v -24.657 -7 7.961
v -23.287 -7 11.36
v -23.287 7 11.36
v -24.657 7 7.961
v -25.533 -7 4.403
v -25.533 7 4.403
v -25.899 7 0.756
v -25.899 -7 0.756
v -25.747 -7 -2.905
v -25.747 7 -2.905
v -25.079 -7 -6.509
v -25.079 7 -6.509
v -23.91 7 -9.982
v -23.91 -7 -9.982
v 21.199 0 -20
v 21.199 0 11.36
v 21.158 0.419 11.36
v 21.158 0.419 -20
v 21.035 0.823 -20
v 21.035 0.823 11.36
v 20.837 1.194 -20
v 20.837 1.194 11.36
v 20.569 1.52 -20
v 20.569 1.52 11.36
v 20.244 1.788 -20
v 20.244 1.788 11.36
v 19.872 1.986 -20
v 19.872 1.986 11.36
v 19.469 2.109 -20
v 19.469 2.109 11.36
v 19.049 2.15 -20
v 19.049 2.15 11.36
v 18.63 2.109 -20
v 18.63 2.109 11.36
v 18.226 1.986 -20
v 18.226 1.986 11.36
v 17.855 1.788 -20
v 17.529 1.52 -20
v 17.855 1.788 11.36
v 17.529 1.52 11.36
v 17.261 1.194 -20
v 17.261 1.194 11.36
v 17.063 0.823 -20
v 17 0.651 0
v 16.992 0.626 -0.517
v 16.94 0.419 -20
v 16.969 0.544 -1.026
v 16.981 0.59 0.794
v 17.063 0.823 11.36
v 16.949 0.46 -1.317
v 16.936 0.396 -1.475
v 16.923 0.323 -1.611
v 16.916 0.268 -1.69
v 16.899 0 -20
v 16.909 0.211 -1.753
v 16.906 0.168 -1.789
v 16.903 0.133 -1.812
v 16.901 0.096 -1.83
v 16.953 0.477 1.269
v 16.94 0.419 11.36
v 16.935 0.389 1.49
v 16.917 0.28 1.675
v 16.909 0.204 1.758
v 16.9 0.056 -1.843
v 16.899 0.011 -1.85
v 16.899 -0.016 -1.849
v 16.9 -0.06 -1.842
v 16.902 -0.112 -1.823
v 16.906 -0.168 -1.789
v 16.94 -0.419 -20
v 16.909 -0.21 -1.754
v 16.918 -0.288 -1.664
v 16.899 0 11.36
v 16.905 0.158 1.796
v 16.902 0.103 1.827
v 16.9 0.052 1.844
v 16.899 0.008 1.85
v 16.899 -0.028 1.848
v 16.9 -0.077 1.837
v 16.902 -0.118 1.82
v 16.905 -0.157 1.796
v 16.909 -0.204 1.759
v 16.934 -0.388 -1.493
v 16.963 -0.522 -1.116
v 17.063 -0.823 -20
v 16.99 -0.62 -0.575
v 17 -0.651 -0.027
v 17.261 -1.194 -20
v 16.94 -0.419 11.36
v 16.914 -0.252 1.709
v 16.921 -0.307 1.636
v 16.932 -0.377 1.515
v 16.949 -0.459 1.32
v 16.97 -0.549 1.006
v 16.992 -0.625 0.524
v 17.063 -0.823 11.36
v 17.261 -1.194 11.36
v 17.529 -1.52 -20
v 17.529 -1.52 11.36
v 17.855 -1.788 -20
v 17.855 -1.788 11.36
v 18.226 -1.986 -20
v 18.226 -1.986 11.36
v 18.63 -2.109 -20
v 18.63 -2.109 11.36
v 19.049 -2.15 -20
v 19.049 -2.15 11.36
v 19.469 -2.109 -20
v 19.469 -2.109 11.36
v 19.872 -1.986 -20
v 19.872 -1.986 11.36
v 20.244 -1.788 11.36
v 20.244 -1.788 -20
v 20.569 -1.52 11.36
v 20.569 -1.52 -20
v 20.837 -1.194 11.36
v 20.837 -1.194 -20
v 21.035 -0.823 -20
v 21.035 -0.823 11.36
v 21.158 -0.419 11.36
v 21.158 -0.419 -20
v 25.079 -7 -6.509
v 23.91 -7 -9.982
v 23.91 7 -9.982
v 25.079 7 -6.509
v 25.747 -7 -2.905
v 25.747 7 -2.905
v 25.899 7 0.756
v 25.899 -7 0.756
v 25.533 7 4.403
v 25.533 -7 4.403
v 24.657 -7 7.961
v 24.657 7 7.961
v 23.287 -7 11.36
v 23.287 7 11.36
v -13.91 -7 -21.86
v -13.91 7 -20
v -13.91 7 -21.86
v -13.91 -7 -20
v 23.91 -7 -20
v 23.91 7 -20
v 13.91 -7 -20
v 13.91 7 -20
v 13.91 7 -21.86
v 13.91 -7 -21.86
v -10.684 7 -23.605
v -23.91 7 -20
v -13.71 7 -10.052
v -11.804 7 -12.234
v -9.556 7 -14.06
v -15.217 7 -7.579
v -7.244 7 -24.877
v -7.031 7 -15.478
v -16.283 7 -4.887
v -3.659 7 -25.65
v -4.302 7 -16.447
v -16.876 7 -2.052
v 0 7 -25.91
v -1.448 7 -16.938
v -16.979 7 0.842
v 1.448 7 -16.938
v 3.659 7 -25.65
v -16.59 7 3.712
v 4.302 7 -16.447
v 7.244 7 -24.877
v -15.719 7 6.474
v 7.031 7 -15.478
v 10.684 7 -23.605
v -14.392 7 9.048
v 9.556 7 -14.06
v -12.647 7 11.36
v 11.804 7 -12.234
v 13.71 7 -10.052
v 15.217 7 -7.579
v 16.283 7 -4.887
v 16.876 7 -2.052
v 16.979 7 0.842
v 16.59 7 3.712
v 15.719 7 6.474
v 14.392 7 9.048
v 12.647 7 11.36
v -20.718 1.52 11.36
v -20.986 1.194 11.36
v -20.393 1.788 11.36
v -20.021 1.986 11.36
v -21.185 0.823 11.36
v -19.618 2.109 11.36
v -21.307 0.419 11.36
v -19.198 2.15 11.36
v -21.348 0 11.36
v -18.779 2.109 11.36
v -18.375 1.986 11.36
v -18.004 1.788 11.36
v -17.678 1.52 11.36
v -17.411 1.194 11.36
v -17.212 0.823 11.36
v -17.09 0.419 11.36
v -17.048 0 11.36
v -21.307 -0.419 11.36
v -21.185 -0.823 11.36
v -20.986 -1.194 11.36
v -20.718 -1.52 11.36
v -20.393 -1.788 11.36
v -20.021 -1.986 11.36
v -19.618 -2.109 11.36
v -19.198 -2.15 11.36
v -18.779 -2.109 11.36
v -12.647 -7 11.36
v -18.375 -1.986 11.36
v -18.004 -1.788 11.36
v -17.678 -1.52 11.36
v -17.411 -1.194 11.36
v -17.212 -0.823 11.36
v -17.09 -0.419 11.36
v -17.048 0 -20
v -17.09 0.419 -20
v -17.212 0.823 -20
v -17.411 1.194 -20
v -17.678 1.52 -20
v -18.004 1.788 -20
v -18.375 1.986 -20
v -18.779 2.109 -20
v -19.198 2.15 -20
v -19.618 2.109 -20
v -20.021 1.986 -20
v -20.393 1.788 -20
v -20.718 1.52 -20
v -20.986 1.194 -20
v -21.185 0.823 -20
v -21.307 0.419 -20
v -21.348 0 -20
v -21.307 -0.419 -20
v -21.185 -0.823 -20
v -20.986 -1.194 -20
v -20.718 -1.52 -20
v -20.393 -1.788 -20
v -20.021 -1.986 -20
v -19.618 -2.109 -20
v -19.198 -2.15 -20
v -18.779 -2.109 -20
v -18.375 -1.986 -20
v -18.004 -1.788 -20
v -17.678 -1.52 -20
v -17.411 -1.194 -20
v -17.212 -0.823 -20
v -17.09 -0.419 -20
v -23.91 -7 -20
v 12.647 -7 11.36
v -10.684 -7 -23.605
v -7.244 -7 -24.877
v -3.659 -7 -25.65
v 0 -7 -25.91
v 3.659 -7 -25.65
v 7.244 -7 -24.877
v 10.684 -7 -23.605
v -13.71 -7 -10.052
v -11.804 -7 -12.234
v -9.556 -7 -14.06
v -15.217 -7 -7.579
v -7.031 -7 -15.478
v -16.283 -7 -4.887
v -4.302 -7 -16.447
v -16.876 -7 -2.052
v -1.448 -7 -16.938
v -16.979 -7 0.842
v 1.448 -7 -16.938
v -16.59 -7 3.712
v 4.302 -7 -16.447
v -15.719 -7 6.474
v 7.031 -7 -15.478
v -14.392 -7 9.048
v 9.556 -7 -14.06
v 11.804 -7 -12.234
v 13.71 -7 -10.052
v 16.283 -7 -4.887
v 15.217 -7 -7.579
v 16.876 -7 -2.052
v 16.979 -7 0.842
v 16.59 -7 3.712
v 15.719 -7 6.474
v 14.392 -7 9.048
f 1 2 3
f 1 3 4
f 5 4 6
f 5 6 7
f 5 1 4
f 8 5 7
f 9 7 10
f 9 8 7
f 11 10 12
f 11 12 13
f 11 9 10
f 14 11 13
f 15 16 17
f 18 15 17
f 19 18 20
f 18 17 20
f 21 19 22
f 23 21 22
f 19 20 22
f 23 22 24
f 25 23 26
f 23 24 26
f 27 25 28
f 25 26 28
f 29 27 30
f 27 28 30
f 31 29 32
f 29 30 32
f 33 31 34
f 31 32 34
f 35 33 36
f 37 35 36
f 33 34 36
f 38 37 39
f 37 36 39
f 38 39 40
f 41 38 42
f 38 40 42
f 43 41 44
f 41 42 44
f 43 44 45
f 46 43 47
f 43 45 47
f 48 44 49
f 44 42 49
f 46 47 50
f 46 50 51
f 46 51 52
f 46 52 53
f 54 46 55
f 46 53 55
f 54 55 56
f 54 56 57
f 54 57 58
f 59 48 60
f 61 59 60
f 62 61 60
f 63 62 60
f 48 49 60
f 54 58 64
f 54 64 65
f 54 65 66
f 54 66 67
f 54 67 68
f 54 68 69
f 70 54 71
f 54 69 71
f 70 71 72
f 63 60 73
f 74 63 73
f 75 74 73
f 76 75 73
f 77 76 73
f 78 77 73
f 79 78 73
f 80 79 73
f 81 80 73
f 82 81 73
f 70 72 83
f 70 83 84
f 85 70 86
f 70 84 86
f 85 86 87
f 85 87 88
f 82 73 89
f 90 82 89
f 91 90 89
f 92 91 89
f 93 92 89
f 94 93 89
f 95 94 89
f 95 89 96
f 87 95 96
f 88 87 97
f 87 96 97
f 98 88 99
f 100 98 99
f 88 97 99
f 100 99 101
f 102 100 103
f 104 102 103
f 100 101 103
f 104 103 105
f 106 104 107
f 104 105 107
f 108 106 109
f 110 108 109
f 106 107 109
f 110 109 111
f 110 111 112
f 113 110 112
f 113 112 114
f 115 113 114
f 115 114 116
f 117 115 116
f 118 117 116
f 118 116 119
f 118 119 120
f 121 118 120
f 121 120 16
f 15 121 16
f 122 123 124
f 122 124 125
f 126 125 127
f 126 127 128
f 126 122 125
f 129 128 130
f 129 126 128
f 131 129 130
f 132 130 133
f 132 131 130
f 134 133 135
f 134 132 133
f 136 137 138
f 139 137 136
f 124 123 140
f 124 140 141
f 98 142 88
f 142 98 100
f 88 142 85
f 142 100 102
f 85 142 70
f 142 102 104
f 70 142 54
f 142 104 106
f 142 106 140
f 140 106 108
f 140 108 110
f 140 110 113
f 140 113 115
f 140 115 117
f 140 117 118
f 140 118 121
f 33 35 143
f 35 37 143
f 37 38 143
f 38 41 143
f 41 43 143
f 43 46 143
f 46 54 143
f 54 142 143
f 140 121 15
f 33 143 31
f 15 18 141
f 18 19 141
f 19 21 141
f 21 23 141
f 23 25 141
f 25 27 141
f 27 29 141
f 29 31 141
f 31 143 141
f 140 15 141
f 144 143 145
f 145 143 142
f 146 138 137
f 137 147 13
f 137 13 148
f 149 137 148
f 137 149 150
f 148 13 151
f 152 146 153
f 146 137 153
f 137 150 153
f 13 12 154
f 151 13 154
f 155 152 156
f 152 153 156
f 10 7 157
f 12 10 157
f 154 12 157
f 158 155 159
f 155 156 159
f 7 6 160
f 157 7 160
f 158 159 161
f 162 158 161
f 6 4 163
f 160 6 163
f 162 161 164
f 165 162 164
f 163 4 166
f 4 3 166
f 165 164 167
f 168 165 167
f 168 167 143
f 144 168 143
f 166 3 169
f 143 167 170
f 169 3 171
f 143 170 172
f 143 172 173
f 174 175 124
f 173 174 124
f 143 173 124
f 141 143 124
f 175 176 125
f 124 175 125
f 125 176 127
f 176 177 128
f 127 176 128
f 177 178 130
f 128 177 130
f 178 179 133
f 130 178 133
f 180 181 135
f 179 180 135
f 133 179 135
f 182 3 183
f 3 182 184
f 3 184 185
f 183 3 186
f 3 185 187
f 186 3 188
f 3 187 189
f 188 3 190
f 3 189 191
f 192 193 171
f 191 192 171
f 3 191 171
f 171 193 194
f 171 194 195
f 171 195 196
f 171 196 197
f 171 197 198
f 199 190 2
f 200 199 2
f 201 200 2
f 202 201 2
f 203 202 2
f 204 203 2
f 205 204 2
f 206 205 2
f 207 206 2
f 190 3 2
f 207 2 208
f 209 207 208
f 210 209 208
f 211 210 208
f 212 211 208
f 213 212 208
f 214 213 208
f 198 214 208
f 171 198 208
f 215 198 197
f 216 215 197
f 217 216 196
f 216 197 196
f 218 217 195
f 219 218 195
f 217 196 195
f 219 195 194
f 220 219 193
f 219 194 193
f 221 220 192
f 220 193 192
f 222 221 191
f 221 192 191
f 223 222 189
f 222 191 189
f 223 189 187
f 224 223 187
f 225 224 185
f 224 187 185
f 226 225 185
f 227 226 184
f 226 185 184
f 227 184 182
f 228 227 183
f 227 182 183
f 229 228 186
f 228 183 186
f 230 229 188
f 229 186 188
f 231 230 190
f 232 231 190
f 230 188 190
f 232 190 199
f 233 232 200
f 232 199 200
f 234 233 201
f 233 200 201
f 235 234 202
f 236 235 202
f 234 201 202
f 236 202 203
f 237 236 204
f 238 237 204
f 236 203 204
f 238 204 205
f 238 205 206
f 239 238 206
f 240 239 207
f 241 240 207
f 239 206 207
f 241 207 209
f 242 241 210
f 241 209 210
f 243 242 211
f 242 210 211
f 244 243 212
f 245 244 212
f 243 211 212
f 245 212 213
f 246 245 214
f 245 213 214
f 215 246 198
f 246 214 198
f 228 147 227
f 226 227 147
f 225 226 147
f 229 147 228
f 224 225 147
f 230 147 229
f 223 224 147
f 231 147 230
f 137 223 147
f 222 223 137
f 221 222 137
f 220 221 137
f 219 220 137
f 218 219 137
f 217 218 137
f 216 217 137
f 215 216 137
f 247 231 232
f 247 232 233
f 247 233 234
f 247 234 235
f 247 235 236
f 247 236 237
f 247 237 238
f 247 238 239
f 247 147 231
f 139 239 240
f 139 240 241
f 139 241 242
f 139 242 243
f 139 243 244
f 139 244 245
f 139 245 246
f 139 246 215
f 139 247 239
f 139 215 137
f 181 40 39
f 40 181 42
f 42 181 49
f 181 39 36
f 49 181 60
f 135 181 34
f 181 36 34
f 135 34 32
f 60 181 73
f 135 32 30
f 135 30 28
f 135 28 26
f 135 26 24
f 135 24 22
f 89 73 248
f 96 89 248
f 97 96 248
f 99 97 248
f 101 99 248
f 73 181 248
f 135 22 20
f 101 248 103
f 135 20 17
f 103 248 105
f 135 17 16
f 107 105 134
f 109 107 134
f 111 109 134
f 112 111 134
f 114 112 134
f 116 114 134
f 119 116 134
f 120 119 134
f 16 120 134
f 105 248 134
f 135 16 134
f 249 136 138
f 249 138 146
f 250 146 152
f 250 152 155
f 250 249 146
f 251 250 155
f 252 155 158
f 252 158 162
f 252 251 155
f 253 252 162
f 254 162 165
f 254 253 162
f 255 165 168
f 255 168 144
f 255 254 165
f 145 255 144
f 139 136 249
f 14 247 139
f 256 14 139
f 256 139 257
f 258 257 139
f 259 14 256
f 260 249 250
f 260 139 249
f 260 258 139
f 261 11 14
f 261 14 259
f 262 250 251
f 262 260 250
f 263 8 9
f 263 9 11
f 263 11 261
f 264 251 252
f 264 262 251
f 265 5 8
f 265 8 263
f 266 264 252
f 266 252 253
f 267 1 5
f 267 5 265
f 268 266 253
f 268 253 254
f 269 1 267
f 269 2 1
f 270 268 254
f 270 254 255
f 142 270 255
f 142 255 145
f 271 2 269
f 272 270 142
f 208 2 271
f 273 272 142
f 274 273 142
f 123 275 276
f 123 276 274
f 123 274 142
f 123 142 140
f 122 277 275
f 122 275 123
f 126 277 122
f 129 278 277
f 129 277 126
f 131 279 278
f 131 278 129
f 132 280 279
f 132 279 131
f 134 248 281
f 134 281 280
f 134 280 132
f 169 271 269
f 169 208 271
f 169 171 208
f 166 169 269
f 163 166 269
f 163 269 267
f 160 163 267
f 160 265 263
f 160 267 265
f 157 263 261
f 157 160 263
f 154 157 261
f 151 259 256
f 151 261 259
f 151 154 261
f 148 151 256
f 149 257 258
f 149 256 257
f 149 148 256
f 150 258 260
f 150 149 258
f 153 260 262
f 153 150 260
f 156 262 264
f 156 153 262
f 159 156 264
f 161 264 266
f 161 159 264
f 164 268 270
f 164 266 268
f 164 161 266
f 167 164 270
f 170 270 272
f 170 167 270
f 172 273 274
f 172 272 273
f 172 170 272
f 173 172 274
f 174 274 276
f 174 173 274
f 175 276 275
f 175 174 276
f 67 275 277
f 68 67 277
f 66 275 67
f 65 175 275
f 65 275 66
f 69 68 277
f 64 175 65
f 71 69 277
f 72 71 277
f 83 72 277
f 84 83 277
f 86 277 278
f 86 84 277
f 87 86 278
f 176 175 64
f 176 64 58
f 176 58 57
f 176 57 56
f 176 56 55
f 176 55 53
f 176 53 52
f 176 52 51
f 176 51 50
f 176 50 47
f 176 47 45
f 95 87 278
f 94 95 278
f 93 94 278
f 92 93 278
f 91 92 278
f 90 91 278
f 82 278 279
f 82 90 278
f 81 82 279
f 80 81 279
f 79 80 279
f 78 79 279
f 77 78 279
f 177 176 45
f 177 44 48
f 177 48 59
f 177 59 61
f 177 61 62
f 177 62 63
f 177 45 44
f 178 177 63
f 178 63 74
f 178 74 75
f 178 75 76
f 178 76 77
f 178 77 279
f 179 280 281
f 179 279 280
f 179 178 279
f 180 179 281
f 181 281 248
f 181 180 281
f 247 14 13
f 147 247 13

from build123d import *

# Parameters (mm, degrees)
F0_R          = 25.91
F1_DEPTH      = 7
F1_DEPTH_BACK = 7
F2_R          = 17
F3_DEPTH      = 7
F3_DEPTH_BACK = 7
F6_START      = -6
F5_W          = 8
F5_H          = 14
F6_DEPTH      = 14
F7_R          = 2.15
F8_DEPTH      = 30
F8_DEPTH_BACK = 30
F9_W          = 10
F9_H          = 14
F10_DEPTH     = 10
F14_W         = 122.705668211
F14_H         = 84.9680826068
F15_DEPTH     = 18


with BuildPart() as f1:
    # F0 (on Front) → F1 (new body, two sides)
    with BuildSketch(Plane.XZ) as f1_sk:
        Circle(F0_R)
    extrude(amount=F1_DEPTH)
    extrude(f1_sk.sketch, amount=-F1_DEPTH_BACK)

    # F2 (on Front) → F3 (cut, two sides)
    with BuildSketch(Plane.XZ) as f3_sk:
        Circle(F2_R)
    extrude(amount=-F3_DEPTH, mode=Mode.SUBTRACT)
    extrude(f3_sk.sketch, amount=F3_DEPTH_BACK, mode=Mode.SUBTRACT)

    # F5 (on face) → F6 (join)
    with BuildSketch(Plane.XY.offset(F6_START)):
        with Locations((-19.91, 0)):
            Rectangle(F5_W, F5_H)
        with Locations((19.91, 0)):
            Rectangle(F5_W, F5_H)
    extrude(amount=-F6_DEPTH)

    # F7 (on face) → F8 (cut, two sides)
    with BuildSketch(Plane.XY) as f8_sk:
        with Locations((-19.1982129737, 0)):
            Circle(F7_R)
        with Locations((19.0490627756, 0)):
            Circle(F7_R)
    extrude(amount=F8_DEPTH, mode=Mode.SUBTRACT)
    extrude(f8_sk.sketch, amount=-F8_DEPTH_BACK, mode=Mode.SUBTRACT)

    # F9 (on face) → F10 (cut)
    with BuildSketch(Plane(origin=(0, 0, -20), x_dir=(1, 0, 0), z_dir=(0, 0, -1))):
        with Locations((-18.91, 0)):
            Rectangle(F9_W, F9_H)
        with Locations((18.91, 0)):
            Rectangle(F9_W, F9_H)
    extrude(amount=F10_DEPTH, mode=Mode.SUBTRACT)

    # F14 (on 3pt) → F15 (cut)
    with BuildSketch(Plane(origin=(0, 0, 11.36), x_dir=(1, 0, 0), z_dir=(0, 0, -1))):
        with Locations((8.9623853564, -3.6773085594)):
            Rectangle(F14_W, F14_H)
    extrude(amount=-F15_DEPTH, mode=Mode.SUBTRACT)


solid = f1.part
